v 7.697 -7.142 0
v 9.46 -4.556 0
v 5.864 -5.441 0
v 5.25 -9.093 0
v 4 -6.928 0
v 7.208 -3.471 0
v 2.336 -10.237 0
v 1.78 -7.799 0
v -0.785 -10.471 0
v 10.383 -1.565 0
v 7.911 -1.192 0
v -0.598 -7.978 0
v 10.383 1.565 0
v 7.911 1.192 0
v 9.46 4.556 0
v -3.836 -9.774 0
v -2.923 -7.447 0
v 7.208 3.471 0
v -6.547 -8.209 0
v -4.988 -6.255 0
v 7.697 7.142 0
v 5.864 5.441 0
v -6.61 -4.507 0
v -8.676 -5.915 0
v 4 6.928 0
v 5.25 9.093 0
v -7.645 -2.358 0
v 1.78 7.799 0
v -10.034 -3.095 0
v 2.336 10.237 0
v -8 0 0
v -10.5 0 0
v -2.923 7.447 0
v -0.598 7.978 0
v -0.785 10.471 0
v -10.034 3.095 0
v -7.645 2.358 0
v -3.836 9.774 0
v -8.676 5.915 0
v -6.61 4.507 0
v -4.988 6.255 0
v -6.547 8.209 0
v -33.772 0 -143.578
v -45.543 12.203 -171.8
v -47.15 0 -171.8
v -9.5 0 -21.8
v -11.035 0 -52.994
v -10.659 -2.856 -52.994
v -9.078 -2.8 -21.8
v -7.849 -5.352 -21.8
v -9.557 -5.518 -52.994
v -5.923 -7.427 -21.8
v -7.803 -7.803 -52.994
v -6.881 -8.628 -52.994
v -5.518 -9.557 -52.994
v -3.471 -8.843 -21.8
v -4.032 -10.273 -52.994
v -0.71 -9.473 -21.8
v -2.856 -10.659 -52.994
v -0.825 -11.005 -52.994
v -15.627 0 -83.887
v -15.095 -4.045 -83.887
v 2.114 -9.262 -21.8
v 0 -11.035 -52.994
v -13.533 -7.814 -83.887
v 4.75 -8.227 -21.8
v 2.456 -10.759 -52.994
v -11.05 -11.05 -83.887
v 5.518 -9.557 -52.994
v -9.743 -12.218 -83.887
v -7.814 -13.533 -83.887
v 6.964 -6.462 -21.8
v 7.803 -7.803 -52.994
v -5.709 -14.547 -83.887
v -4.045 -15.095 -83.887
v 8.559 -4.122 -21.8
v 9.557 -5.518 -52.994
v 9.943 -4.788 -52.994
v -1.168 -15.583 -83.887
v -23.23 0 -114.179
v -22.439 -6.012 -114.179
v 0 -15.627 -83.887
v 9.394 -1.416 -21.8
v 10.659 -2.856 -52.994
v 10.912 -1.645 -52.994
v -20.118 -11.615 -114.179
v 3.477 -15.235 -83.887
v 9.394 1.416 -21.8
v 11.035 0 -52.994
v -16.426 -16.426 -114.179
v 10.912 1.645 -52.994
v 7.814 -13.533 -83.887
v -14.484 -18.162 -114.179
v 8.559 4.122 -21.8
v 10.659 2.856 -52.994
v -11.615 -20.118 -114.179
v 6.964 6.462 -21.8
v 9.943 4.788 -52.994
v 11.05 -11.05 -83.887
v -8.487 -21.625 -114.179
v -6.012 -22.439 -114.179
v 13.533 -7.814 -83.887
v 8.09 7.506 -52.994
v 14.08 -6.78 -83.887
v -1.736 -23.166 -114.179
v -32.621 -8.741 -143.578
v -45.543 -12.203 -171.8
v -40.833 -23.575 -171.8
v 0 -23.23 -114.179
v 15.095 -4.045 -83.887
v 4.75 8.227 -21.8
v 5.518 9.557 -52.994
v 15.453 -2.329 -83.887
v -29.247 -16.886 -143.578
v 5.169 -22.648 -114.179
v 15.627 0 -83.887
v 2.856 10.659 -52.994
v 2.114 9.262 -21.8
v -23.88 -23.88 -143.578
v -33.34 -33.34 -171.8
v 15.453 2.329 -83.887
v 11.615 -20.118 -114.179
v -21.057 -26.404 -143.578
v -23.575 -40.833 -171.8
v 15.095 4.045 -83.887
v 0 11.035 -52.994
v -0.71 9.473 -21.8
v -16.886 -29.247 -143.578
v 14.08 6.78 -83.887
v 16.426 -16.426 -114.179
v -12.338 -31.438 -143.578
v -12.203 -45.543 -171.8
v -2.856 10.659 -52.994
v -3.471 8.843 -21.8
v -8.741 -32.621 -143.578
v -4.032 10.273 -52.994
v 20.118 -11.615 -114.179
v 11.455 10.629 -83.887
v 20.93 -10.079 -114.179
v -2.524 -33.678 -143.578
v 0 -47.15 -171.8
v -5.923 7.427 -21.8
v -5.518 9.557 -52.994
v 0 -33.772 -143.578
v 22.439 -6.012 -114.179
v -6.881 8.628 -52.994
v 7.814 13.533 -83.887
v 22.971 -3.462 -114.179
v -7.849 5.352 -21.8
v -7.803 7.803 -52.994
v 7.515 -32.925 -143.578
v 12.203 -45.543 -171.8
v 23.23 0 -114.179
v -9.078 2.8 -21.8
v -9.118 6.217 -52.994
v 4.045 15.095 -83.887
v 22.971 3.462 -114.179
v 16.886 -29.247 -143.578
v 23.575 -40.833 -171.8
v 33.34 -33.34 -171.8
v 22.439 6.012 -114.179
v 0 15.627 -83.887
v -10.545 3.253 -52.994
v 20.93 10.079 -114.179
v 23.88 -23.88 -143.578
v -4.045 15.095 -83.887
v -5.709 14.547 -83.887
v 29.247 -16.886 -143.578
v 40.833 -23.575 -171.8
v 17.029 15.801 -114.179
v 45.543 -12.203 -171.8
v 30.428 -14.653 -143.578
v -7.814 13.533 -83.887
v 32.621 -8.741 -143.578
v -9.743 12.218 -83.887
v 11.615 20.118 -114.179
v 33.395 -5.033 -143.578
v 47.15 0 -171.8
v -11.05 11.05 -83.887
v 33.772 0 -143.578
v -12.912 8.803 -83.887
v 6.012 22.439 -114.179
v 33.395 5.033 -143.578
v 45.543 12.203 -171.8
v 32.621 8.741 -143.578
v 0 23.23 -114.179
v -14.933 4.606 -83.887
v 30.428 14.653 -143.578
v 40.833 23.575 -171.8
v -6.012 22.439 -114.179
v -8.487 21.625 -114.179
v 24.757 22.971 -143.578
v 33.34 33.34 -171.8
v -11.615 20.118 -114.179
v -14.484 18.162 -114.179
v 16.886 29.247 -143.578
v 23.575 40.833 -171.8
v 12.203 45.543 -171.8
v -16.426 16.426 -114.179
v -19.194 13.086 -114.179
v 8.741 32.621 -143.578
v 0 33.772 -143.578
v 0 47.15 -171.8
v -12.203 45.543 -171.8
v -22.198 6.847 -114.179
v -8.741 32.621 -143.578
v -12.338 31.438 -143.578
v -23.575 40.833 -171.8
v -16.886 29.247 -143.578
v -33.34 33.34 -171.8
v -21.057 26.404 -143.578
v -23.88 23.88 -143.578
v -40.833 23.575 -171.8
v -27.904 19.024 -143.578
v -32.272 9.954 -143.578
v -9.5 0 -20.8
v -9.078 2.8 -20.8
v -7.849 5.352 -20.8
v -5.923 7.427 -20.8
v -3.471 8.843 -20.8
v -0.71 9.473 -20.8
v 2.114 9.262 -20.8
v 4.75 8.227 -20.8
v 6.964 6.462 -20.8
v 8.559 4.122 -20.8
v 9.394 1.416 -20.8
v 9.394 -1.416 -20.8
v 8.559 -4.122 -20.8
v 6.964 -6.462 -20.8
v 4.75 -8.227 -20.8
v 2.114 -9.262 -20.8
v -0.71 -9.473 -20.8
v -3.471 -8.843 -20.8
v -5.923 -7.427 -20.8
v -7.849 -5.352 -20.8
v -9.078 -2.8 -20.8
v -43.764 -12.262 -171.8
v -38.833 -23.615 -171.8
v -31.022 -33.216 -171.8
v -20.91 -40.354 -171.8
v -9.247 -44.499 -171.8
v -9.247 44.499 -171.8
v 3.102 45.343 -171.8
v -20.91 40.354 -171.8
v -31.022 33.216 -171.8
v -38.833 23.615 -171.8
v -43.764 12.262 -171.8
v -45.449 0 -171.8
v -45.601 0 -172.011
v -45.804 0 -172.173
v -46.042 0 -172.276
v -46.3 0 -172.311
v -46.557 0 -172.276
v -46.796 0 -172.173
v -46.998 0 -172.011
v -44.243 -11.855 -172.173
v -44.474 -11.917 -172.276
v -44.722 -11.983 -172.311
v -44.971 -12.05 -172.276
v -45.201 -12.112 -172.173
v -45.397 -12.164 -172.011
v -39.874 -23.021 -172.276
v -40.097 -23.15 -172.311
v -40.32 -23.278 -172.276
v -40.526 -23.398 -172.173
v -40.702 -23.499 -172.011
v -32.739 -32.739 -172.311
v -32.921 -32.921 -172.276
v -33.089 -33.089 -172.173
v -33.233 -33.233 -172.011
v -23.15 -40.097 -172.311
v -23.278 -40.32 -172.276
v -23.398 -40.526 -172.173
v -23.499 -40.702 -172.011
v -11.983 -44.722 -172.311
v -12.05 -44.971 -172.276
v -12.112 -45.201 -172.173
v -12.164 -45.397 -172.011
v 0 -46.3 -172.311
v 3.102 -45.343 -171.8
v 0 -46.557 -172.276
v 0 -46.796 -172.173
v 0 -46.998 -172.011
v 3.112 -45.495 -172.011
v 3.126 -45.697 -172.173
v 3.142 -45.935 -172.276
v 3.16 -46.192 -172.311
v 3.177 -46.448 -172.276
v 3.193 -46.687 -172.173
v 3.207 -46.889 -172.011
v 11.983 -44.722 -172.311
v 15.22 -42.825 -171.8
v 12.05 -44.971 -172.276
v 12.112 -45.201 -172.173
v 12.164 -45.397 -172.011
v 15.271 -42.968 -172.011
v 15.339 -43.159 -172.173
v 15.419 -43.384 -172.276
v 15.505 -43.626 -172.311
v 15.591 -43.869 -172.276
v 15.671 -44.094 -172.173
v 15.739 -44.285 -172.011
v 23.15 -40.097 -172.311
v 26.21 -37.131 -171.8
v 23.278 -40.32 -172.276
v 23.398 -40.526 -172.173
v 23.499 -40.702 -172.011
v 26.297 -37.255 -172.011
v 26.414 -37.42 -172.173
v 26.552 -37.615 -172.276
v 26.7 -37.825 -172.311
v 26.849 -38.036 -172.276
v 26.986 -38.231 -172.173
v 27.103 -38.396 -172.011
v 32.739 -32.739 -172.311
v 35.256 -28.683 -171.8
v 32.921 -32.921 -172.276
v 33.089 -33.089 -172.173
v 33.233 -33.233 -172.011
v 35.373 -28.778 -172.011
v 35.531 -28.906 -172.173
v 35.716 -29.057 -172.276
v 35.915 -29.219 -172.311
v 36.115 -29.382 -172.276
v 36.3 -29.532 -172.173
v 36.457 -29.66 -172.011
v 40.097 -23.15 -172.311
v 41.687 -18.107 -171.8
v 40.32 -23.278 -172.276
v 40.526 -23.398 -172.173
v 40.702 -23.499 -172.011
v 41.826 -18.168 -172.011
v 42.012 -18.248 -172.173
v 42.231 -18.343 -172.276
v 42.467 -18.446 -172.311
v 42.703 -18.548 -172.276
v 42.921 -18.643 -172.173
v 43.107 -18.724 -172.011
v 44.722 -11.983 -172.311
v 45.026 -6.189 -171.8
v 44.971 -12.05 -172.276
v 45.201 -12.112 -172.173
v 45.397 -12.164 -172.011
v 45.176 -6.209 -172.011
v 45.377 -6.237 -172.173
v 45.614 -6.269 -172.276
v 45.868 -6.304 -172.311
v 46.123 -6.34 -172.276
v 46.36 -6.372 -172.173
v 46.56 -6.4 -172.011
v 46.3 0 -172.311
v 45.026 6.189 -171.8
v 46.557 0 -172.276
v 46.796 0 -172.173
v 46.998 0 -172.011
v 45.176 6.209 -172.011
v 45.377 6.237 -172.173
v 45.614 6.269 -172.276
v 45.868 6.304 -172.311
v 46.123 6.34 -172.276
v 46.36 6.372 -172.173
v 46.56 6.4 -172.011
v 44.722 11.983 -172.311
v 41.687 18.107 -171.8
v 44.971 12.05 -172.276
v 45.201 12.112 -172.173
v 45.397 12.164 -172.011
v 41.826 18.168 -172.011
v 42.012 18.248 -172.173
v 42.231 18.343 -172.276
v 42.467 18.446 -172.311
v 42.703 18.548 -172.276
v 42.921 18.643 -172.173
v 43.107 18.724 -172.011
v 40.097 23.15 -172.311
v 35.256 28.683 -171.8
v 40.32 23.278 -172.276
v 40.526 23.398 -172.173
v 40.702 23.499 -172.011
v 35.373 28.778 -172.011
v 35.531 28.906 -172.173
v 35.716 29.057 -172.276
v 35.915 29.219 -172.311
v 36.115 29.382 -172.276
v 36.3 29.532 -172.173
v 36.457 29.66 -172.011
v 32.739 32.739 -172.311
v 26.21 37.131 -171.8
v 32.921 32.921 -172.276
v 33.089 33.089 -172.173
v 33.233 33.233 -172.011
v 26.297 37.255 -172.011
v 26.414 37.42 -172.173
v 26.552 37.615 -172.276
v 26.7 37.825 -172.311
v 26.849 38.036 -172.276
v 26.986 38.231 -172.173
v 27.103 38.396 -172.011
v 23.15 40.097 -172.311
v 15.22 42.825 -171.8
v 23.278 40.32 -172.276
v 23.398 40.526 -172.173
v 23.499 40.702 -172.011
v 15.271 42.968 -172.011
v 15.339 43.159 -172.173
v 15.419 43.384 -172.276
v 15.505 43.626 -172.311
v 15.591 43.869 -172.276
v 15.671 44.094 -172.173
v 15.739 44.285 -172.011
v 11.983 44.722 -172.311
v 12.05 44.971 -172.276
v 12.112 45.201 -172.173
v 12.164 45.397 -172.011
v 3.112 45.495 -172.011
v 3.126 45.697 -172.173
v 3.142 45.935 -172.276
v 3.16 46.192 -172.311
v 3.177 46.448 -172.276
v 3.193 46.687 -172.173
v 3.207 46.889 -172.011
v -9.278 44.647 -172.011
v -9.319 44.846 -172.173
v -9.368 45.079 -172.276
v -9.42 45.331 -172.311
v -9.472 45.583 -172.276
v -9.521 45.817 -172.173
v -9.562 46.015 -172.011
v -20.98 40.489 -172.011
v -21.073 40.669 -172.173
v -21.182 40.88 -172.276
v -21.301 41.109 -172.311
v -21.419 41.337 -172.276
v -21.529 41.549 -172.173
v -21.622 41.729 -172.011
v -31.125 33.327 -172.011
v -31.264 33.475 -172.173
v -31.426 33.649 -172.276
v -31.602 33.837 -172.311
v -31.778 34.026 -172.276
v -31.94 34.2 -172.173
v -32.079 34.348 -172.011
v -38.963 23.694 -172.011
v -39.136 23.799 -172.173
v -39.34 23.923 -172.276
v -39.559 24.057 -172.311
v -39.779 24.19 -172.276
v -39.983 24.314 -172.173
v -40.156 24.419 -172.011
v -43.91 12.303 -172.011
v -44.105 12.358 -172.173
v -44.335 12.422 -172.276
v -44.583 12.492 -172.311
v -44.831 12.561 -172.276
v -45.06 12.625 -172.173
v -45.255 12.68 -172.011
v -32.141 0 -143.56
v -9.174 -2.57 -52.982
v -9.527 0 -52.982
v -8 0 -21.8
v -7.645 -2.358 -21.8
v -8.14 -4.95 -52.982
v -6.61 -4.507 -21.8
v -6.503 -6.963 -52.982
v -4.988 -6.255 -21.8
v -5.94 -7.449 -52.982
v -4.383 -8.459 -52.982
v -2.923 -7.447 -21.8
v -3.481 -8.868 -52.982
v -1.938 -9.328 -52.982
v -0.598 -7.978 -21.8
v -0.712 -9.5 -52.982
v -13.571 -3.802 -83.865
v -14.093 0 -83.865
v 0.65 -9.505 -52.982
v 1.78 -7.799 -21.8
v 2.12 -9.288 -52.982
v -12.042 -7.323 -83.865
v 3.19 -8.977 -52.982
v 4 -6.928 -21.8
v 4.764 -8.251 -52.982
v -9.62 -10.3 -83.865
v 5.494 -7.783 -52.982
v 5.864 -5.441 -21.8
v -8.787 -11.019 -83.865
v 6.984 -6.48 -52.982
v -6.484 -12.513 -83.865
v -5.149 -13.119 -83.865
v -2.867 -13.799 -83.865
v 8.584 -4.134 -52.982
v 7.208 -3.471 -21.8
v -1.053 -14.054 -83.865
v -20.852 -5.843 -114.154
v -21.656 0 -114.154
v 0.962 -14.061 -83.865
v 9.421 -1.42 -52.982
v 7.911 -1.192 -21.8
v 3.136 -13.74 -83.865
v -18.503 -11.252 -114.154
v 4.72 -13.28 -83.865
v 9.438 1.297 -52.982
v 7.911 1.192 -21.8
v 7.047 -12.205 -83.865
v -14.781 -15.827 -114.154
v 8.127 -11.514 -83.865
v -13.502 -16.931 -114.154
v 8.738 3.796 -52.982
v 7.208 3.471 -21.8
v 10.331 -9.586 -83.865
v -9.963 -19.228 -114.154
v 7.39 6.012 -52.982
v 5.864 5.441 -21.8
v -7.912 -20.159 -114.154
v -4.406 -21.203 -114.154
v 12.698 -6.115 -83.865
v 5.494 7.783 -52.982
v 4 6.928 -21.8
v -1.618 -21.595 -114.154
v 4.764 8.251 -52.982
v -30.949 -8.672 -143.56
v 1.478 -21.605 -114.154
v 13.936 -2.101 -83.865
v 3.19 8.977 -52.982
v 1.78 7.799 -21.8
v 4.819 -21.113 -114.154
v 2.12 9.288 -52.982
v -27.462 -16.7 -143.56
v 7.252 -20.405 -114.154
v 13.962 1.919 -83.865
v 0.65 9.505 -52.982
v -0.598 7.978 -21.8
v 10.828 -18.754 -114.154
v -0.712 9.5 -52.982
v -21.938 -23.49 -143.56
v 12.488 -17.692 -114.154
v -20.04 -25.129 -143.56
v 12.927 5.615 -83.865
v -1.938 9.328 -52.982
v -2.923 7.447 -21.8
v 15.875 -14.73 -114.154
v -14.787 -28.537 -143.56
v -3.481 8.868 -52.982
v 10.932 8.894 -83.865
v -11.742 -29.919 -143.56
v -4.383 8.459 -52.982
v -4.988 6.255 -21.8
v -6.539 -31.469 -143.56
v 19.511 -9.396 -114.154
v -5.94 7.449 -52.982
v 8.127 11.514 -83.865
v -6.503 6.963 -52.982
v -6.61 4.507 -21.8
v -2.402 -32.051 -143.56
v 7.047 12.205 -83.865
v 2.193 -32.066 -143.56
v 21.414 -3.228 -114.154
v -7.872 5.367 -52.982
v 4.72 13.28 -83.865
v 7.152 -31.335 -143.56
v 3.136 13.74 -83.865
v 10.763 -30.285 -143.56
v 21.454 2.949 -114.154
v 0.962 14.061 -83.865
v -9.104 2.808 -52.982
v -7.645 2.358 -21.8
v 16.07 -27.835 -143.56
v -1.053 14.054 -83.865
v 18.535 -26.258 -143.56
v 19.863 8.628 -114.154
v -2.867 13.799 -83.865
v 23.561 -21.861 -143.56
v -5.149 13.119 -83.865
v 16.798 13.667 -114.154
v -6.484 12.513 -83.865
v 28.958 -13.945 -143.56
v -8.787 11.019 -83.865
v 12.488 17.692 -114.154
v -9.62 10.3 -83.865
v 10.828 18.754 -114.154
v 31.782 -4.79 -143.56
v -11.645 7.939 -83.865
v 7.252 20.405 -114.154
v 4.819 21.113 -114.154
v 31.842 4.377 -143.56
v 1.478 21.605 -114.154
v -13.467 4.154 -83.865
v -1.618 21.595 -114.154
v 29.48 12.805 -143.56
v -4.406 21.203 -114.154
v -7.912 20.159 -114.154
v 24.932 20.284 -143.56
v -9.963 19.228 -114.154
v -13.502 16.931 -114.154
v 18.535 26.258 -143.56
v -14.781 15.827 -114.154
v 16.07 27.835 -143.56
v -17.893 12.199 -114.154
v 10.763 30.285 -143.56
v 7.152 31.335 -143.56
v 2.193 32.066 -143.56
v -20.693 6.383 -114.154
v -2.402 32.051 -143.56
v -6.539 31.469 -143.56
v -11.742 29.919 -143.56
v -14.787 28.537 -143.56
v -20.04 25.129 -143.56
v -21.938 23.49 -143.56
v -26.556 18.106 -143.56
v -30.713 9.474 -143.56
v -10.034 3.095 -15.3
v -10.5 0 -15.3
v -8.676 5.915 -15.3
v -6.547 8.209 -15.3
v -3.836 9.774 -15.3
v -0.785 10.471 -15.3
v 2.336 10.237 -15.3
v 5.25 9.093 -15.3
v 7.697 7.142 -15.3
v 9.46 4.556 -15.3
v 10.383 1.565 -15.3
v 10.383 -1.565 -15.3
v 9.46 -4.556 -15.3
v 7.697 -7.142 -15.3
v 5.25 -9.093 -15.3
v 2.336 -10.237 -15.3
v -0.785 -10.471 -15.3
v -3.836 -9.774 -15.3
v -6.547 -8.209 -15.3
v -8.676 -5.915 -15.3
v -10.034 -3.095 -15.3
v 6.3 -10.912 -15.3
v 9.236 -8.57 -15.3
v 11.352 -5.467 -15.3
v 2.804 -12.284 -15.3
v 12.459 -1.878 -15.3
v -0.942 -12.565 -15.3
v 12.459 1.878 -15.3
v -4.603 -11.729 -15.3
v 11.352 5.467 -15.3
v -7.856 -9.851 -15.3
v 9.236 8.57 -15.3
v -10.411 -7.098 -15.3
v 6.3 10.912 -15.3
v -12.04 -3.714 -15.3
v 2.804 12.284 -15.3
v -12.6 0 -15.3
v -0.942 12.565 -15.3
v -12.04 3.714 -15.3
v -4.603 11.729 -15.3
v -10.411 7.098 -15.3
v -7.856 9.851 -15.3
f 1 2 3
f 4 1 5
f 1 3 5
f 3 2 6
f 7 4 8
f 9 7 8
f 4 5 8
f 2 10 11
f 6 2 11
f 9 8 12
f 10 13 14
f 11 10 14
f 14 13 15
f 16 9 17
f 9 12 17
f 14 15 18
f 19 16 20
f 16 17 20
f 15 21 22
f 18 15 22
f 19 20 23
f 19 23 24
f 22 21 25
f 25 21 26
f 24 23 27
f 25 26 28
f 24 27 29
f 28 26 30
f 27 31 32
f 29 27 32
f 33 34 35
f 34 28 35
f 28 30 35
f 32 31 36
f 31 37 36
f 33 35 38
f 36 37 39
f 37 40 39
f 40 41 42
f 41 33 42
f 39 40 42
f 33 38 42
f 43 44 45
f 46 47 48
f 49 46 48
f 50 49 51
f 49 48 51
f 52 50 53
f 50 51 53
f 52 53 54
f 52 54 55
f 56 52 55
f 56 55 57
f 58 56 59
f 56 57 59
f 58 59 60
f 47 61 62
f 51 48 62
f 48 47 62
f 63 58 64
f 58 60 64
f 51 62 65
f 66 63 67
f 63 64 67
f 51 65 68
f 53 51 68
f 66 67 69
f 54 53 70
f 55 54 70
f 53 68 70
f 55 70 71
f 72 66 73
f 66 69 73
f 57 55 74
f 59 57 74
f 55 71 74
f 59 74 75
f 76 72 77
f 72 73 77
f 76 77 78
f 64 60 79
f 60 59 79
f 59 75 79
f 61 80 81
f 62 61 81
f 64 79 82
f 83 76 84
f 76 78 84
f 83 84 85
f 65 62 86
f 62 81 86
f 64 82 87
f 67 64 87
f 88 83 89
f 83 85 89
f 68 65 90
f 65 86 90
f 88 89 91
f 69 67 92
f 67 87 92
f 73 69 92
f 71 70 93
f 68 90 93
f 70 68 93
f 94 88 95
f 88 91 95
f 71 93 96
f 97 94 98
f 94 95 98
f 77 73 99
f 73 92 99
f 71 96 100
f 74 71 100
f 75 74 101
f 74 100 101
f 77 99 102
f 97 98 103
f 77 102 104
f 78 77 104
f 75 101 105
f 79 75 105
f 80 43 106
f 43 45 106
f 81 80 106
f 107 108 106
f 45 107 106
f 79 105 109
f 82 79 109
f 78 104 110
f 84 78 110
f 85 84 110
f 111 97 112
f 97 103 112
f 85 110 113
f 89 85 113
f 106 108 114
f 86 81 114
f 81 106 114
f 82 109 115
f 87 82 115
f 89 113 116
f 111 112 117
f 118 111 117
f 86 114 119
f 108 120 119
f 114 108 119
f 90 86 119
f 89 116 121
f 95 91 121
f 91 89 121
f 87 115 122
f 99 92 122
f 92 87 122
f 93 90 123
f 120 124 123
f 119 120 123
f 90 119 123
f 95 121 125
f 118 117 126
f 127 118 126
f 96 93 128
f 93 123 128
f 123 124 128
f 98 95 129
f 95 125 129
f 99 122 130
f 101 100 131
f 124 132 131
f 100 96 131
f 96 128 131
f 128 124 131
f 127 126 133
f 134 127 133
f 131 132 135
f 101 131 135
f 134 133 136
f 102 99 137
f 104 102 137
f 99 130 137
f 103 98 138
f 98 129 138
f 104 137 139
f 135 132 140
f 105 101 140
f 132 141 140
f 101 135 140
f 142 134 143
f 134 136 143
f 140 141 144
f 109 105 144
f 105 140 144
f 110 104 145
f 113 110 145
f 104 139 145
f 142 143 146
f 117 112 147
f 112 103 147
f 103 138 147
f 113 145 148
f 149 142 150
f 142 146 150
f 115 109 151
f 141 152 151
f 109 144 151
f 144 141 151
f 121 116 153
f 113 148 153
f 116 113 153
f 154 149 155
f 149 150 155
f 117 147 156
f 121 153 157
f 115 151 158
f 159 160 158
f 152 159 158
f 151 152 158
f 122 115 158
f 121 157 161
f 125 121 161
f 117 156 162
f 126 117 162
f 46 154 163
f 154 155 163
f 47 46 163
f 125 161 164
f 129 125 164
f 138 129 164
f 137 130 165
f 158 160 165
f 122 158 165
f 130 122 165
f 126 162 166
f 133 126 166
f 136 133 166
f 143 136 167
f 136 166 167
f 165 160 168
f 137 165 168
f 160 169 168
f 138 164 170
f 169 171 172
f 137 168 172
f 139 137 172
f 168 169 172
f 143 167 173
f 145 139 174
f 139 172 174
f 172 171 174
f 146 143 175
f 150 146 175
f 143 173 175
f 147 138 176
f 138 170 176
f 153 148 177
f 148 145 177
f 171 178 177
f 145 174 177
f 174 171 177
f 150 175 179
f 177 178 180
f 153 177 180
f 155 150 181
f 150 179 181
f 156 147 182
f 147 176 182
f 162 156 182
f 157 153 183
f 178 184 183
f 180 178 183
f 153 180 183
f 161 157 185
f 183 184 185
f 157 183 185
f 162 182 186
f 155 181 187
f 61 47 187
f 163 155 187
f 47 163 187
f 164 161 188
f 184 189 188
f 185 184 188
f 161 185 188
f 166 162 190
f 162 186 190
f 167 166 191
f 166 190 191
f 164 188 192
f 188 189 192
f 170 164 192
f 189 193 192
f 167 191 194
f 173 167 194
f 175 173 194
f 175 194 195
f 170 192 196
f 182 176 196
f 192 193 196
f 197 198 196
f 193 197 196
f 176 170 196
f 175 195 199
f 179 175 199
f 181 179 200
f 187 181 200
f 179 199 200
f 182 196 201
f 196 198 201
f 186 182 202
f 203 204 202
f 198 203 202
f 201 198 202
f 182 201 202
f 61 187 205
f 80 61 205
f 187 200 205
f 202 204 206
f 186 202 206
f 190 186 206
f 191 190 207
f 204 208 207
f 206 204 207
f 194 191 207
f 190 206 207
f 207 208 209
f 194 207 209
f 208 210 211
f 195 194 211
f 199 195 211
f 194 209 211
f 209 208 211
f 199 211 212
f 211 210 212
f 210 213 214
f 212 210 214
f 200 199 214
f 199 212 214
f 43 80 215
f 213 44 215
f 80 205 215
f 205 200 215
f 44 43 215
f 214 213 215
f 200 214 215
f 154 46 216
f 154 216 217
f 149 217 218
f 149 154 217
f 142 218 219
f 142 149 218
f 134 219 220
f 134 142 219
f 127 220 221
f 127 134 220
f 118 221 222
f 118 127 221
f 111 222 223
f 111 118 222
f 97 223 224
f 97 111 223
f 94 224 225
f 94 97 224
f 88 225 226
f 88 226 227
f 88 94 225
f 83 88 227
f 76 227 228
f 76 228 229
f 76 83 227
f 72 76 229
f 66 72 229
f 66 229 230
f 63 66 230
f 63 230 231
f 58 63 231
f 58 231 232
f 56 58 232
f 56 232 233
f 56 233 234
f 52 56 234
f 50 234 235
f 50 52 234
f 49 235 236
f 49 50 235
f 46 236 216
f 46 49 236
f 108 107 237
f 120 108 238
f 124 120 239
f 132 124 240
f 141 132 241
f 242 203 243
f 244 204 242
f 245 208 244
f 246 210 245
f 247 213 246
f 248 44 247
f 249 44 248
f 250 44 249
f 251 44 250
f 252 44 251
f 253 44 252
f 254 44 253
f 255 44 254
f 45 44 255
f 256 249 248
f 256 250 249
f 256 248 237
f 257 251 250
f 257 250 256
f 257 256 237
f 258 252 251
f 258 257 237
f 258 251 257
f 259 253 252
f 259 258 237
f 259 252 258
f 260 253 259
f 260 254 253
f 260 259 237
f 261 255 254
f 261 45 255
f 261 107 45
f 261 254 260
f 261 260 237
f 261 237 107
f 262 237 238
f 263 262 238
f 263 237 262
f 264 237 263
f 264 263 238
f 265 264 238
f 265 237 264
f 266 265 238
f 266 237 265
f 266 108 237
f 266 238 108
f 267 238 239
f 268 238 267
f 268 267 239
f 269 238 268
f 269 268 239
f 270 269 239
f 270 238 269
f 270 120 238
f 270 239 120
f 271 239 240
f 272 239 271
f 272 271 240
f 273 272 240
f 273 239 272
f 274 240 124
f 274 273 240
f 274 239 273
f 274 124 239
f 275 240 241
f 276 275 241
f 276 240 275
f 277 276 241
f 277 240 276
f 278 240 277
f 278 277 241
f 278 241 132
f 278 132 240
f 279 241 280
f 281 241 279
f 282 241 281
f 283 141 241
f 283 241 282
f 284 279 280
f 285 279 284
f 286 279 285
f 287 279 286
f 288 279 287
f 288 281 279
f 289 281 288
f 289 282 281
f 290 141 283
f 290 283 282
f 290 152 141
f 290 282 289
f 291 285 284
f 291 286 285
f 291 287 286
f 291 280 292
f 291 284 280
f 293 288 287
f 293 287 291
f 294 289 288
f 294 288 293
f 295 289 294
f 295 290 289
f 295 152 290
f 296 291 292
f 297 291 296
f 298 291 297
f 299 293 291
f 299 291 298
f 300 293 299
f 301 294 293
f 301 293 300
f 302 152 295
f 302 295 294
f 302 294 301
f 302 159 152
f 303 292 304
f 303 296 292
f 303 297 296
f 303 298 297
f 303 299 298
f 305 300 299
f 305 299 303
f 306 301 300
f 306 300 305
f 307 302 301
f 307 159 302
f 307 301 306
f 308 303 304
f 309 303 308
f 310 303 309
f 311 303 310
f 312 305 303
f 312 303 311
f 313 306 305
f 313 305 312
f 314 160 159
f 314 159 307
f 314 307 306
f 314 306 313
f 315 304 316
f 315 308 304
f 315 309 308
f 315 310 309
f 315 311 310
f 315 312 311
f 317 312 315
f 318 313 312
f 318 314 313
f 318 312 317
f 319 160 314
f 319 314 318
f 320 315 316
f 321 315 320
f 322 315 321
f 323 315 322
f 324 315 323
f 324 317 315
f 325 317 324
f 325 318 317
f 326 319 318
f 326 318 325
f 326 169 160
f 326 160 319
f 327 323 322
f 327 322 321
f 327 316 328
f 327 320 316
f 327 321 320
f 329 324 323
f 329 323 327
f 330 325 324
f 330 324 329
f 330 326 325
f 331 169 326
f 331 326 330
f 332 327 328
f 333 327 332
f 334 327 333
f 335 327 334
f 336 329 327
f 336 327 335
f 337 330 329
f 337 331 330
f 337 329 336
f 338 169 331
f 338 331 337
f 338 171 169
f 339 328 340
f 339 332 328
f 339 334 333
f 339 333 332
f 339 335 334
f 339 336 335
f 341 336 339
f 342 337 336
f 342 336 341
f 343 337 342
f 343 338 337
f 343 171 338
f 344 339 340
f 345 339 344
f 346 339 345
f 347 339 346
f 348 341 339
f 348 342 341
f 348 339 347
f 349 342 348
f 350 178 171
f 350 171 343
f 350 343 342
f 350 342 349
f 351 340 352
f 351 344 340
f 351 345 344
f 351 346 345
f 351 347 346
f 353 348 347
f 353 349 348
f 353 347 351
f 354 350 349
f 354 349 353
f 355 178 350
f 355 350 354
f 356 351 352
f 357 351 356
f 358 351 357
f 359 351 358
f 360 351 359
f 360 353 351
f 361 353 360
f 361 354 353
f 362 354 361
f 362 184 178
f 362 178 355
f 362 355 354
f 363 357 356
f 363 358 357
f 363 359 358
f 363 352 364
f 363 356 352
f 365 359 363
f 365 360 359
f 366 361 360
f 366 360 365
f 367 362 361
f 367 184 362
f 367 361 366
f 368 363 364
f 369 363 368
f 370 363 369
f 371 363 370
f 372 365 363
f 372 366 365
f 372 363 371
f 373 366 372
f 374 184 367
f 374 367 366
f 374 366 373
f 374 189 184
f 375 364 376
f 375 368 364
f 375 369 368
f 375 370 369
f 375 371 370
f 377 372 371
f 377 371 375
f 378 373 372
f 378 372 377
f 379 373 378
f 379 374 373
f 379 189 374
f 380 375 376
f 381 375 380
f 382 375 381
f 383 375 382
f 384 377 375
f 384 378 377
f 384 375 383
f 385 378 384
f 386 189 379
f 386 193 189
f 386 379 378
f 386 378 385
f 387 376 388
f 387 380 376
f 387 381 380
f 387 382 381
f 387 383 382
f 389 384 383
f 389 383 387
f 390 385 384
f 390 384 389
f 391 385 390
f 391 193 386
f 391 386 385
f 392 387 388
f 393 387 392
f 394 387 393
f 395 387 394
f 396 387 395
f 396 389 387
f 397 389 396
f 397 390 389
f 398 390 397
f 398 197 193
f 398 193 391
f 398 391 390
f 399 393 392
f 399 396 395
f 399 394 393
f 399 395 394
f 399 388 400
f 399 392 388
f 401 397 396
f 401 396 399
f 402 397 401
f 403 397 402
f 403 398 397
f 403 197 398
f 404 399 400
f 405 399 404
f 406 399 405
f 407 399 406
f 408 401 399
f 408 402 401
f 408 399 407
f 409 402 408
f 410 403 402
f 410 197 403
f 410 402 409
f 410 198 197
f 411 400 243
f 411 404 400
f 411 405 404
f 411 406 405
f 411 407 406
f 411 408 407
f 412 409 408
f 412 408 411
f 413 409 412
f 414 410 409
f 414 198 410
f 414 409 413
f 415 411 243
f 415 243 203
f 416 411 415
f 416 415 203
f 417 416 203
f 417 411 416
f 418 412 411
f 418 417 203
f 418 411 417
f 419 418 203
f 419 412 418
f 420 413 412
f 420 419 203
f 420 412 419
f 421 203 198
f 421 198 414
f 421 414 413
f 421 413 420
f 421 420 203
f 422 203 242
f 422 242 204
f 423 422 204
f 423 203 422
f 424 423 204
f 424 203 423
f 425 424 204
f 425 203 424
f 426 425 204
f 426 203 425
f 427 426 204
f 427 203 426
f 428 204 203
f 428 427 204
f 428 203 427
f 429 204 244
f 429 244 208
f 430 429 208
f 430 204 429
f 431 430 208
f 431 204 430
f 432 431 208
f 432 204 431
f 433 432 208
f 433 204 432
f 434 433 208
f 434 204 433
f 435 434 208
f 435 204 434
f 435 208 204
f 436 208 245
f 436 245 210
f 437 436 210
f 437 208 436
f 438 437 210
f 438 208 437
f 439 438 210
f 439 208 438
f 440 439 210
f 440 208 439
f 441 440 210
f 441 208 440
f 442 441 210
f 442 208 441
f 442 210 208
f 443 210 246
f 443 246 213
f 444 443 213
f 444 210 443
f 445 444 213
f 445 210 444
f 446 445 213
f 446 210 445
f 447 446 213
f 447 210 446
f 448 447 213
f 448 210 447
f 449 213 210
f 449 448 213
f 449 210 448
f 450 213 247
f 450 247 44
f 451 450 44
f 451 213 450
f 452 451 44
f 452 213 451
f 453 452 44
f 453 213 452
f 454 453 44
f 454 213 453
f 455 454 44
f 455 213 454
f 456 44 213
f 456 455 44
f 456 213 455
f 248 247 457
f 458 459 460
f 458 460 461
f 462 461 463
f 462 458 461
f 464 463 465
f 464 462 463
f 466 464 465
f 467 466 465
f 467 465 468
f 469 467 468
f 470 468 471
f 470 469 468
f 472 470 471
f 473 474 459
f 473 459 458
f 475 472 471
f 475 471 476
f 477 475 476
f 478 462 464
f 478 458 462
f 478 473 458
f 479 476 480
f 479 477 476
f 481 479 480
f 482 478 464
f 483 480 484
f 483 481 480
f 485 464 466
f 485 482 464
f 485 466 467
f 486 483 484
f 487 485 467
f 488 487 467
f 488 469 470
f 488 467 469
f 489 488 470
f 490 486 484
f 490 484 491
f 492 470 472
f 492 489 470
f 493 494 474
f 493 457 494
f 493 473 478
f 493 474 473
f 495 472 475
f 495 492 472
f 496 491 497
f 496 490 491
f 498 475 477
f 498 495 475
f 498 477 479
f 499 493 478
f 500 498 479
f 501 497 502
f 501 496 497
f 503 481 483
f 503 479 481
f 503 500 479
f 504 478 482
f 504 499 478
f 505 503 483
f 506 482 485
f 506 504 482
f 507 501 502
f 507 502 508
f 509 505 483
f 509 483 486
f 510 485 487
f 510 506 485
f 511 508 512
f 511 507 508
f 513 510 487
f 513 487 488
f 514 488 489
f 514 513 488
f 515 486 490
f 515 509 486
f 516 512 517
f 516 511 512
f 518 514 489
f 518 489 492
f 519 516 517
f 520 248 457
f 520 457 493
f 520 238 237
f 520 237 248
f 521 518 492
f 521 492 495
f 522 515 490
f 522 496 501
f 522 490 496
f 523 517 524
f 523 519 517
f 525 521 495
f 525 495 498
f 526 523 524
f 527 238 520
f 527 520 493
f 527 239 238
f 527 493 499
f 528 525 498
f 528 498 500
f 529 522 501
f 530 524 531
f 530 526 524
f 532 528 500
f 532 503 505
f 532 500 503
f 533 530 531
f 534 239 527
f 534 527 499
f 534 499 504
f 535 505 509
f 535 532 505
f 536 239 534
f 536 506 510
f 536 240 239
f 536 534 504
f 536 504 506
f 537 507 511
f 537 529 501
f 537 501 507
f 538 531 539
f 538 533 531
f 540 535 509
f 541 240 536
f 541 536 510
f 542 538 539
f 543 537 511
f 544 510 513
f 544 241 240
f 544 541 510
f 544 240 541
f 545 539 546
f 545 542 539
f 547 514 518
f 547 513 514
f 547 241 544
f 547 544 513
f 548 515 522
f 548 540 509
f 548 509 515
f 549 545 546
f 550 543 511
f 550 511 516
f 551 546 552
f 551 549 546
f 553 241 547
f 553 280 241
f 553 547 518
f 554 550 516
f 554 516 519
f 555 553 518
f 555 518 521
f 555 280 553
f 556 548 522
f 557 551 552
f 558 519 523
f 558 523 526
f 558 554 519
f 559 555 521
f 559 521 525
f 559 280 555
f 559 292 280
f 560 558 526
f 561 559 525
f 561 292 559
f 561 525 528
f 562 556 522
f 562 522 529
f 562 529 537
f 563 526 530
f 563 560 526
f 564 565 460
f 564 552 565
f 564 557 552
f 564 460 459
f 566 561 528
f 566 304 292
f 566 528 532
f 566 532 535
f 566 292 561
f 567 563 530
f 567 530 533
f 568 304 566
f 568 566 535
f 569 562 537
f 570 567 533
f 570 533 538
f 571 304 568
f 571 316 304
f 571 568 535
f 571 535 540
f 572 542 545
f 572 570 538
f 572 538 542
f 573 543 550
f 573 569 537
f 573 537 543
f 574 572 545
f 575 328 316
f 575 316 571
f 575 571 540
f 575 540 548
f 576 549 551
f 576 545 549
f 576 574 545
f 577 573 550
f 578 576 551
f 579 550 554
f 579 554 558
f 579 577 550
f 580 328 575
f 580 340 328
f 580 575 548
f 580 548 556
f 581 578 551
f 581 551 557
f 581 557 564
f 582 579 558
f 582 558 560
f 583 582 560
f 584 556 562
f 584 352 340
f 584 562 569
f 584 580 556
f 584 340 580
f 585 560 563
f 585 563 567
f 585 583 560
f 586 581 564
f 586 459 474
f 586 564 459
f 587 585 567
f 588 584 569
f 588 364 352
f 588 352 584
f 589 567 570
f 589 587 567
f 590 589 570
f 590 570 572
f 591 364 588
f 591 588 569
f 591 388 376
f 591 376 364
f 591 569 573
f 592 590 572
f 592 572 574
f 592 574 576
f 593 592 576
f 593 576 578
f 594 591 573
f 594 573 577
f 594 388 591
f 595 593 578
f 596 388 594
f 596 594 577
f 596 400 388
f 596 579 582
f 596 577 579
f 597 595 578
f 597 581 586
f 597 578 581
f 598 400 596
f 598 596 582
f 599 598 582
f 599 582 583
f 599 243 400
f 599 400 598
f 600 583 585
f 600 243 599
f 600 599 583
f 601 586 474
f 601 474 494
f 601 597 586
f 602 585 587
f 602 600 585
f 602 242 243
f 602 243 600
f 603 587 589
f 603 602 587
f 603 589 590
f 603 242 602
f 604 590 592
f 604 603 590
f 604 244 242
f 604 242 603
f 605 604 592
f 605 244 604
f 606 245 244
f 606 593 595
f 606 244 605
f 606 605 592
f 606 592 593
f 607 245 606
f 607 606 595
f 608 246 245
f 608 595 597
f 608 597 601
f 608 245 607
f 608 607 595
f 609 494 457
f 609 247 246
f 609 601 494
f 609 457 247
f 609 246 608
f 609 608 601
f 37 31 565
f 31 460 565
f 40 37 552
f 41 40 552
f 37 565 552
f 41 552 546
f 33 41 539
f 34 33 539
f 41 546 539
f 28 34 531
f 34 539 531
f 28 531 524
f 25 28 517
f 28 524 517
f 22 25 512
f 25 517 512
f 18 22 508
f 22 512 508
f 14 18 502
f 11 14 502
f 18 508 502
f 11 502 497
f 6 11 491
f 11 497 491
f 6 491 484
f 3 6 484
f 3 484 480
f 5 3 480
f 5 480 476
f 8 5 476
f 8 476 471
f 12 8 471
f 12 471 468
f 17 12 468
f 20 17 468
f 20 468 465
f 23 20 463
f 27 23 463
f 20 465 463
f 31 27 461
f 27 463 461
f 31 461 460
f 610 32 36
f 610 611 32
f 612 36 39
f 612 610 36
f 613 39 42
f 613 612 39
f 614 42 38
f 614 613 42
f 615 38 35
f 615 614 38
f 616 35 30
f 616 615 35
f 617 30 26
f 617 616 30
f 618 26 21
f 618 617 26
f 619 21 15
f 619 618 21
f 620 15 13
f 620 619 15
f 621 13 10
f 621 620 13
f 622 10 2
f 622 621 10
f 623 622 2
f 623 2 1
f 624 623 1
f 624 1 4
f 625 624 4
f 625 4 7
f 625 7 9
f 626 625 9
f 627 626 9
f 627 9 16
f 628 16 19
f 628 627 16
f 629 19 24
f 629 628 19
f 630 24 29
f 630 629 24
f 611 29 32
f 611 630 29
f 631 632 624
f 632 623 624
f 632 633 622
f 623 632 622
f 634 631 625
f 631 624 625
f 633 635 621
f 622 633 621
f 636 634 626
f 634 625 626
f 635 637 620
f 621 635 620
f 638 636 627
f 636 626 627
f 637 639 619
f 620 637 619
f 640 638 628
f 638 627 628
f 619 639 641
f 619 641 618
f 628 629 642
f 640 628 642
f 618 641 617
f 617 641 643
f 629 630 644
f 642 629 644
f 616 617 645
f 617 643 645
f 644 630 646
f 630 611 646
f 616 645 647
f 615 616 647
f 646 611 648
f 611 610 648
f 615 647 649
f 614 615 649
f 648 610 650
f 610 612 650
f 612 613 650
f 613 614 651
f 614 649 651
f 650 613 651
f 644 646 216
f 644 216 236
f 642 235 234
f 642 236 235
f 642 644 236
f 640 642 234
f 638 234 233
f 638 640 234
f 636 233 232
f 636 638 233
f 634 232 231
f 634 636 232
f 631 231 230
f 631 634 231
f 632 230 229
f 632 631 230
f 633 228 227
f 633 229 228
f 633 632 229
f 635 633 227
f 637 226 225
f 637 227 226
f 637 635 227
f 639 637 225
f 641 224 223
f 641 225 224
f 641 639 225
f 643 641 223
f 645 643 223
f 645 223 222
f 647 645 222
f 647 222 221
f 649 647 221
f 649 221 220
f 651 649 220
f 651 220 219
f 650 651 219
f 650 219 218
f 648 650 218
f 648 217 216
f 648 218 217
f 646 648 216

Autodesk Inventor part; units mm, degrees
ref_plane "YZ Plane" through (0, 0, 0) normal (1, 0, 0) x (0, 1, 0)
ref_plane "XZ Plane" through (0, 0, 0) normal (0, 1, 0) x (-1, 0, 0)
ref_plane "XY Plane" through (0, 0, 0) normal (0, 0, 1) x (1, 0, 0)
sketch "Sketch1" plane through (0, 0, 0) normal (0, 1, 0) x (-1, 0, 0)
  line L0 (0, 0) -> (10.5, 0) construction
  line L1 (0, 0) -> (0, -171.8) construction
  line L2 (0, -171.8) -> (47.15, -171.8) construction
  line L3 (0, -21.8) -> (9.5, -21.8) construction
  line L4 (0, -20.8) -> (9.5, -20.8) construction
  line L5 (0, -15.3) -> (12.6, -15.3) construction
  line L6 (8, 0) -> (10.5, 0)
  line L7 (10.5, 0) -> (10.5, -15.3)
  line L8 (10.5, -15.3) -> (12.6, -15.3)
  line L9 (12.6, -15.3) -> (9.5, -20.8)
  line L10 (9.5, -20.8) -> (9.5, -21.8)
  line L11 (8, 0) -> (8, -21.8)
  arc A0 (9.5, -21.8) -> (47.15, -171.8) centre (327.1298, -21.8) ccw
  arc A1 (8, -21.8) -> (45.4494, -171.8) centre (327.1298, -21.8) ccw
  arc A2 (45.4494, -171.8) -> (47.15, -171.8) centre (46.2997, -171.3472) ccw
  dimension "d0" = 150
  dimension "d1" = 1
  dimension "d2" = 5.5
  dimension "d3" = 15.3
  dimension "d4" = 47.15
  dimension "d5" = 9.5
  dimension "d6" = 9.5
  dimension "d7" = 12.6
  dimension "d8" = 10.5
  dimension "d9" = 1.5
revolve "Revolution1" add sketch "Sketch1" angle 360 about axis through (0, 0, 0) along (0, 0, -1)
thread "Thread1" size "M22x3" class "6g" standard "ANSI Metric M Profile" full length
equation "\"d0\" = Flare_Length"
equation "\"d1\" = Transition_Length"
equation "\"d2\" = Mount_Flange_Length"
equation "\"d3\" = Mount_Length"
equation "\"d4\" = Flare_Diameter"
equation "\"d6\" = Tail_Diameter"
equation "\"d7\" = Mount_Flange_Diameter"
equation "\"d8\" = Mount_Diameter"
equation "\"d9\" = Bell_Thickness"
equation "\"Transition_Length\" = 1"
equation "\"Flare_Length\" = 150"
equation "\"Mount_Flange_Length\" = 5.5"
equation "\"Mount_Length\" = 15.3"
equation "\"Flare_Diameter\" = 47.15"
equation "\"Tail_Diameter\" = 9.5"
equation "\"Mount_Flange_Diameter\" = 12.6"
equation "\"Mount_Diameter\" = 10.5"
equation "\"Bell_Thickness\" = 1.5"
properties part number "Horn_D" material "Steel, Cast"
